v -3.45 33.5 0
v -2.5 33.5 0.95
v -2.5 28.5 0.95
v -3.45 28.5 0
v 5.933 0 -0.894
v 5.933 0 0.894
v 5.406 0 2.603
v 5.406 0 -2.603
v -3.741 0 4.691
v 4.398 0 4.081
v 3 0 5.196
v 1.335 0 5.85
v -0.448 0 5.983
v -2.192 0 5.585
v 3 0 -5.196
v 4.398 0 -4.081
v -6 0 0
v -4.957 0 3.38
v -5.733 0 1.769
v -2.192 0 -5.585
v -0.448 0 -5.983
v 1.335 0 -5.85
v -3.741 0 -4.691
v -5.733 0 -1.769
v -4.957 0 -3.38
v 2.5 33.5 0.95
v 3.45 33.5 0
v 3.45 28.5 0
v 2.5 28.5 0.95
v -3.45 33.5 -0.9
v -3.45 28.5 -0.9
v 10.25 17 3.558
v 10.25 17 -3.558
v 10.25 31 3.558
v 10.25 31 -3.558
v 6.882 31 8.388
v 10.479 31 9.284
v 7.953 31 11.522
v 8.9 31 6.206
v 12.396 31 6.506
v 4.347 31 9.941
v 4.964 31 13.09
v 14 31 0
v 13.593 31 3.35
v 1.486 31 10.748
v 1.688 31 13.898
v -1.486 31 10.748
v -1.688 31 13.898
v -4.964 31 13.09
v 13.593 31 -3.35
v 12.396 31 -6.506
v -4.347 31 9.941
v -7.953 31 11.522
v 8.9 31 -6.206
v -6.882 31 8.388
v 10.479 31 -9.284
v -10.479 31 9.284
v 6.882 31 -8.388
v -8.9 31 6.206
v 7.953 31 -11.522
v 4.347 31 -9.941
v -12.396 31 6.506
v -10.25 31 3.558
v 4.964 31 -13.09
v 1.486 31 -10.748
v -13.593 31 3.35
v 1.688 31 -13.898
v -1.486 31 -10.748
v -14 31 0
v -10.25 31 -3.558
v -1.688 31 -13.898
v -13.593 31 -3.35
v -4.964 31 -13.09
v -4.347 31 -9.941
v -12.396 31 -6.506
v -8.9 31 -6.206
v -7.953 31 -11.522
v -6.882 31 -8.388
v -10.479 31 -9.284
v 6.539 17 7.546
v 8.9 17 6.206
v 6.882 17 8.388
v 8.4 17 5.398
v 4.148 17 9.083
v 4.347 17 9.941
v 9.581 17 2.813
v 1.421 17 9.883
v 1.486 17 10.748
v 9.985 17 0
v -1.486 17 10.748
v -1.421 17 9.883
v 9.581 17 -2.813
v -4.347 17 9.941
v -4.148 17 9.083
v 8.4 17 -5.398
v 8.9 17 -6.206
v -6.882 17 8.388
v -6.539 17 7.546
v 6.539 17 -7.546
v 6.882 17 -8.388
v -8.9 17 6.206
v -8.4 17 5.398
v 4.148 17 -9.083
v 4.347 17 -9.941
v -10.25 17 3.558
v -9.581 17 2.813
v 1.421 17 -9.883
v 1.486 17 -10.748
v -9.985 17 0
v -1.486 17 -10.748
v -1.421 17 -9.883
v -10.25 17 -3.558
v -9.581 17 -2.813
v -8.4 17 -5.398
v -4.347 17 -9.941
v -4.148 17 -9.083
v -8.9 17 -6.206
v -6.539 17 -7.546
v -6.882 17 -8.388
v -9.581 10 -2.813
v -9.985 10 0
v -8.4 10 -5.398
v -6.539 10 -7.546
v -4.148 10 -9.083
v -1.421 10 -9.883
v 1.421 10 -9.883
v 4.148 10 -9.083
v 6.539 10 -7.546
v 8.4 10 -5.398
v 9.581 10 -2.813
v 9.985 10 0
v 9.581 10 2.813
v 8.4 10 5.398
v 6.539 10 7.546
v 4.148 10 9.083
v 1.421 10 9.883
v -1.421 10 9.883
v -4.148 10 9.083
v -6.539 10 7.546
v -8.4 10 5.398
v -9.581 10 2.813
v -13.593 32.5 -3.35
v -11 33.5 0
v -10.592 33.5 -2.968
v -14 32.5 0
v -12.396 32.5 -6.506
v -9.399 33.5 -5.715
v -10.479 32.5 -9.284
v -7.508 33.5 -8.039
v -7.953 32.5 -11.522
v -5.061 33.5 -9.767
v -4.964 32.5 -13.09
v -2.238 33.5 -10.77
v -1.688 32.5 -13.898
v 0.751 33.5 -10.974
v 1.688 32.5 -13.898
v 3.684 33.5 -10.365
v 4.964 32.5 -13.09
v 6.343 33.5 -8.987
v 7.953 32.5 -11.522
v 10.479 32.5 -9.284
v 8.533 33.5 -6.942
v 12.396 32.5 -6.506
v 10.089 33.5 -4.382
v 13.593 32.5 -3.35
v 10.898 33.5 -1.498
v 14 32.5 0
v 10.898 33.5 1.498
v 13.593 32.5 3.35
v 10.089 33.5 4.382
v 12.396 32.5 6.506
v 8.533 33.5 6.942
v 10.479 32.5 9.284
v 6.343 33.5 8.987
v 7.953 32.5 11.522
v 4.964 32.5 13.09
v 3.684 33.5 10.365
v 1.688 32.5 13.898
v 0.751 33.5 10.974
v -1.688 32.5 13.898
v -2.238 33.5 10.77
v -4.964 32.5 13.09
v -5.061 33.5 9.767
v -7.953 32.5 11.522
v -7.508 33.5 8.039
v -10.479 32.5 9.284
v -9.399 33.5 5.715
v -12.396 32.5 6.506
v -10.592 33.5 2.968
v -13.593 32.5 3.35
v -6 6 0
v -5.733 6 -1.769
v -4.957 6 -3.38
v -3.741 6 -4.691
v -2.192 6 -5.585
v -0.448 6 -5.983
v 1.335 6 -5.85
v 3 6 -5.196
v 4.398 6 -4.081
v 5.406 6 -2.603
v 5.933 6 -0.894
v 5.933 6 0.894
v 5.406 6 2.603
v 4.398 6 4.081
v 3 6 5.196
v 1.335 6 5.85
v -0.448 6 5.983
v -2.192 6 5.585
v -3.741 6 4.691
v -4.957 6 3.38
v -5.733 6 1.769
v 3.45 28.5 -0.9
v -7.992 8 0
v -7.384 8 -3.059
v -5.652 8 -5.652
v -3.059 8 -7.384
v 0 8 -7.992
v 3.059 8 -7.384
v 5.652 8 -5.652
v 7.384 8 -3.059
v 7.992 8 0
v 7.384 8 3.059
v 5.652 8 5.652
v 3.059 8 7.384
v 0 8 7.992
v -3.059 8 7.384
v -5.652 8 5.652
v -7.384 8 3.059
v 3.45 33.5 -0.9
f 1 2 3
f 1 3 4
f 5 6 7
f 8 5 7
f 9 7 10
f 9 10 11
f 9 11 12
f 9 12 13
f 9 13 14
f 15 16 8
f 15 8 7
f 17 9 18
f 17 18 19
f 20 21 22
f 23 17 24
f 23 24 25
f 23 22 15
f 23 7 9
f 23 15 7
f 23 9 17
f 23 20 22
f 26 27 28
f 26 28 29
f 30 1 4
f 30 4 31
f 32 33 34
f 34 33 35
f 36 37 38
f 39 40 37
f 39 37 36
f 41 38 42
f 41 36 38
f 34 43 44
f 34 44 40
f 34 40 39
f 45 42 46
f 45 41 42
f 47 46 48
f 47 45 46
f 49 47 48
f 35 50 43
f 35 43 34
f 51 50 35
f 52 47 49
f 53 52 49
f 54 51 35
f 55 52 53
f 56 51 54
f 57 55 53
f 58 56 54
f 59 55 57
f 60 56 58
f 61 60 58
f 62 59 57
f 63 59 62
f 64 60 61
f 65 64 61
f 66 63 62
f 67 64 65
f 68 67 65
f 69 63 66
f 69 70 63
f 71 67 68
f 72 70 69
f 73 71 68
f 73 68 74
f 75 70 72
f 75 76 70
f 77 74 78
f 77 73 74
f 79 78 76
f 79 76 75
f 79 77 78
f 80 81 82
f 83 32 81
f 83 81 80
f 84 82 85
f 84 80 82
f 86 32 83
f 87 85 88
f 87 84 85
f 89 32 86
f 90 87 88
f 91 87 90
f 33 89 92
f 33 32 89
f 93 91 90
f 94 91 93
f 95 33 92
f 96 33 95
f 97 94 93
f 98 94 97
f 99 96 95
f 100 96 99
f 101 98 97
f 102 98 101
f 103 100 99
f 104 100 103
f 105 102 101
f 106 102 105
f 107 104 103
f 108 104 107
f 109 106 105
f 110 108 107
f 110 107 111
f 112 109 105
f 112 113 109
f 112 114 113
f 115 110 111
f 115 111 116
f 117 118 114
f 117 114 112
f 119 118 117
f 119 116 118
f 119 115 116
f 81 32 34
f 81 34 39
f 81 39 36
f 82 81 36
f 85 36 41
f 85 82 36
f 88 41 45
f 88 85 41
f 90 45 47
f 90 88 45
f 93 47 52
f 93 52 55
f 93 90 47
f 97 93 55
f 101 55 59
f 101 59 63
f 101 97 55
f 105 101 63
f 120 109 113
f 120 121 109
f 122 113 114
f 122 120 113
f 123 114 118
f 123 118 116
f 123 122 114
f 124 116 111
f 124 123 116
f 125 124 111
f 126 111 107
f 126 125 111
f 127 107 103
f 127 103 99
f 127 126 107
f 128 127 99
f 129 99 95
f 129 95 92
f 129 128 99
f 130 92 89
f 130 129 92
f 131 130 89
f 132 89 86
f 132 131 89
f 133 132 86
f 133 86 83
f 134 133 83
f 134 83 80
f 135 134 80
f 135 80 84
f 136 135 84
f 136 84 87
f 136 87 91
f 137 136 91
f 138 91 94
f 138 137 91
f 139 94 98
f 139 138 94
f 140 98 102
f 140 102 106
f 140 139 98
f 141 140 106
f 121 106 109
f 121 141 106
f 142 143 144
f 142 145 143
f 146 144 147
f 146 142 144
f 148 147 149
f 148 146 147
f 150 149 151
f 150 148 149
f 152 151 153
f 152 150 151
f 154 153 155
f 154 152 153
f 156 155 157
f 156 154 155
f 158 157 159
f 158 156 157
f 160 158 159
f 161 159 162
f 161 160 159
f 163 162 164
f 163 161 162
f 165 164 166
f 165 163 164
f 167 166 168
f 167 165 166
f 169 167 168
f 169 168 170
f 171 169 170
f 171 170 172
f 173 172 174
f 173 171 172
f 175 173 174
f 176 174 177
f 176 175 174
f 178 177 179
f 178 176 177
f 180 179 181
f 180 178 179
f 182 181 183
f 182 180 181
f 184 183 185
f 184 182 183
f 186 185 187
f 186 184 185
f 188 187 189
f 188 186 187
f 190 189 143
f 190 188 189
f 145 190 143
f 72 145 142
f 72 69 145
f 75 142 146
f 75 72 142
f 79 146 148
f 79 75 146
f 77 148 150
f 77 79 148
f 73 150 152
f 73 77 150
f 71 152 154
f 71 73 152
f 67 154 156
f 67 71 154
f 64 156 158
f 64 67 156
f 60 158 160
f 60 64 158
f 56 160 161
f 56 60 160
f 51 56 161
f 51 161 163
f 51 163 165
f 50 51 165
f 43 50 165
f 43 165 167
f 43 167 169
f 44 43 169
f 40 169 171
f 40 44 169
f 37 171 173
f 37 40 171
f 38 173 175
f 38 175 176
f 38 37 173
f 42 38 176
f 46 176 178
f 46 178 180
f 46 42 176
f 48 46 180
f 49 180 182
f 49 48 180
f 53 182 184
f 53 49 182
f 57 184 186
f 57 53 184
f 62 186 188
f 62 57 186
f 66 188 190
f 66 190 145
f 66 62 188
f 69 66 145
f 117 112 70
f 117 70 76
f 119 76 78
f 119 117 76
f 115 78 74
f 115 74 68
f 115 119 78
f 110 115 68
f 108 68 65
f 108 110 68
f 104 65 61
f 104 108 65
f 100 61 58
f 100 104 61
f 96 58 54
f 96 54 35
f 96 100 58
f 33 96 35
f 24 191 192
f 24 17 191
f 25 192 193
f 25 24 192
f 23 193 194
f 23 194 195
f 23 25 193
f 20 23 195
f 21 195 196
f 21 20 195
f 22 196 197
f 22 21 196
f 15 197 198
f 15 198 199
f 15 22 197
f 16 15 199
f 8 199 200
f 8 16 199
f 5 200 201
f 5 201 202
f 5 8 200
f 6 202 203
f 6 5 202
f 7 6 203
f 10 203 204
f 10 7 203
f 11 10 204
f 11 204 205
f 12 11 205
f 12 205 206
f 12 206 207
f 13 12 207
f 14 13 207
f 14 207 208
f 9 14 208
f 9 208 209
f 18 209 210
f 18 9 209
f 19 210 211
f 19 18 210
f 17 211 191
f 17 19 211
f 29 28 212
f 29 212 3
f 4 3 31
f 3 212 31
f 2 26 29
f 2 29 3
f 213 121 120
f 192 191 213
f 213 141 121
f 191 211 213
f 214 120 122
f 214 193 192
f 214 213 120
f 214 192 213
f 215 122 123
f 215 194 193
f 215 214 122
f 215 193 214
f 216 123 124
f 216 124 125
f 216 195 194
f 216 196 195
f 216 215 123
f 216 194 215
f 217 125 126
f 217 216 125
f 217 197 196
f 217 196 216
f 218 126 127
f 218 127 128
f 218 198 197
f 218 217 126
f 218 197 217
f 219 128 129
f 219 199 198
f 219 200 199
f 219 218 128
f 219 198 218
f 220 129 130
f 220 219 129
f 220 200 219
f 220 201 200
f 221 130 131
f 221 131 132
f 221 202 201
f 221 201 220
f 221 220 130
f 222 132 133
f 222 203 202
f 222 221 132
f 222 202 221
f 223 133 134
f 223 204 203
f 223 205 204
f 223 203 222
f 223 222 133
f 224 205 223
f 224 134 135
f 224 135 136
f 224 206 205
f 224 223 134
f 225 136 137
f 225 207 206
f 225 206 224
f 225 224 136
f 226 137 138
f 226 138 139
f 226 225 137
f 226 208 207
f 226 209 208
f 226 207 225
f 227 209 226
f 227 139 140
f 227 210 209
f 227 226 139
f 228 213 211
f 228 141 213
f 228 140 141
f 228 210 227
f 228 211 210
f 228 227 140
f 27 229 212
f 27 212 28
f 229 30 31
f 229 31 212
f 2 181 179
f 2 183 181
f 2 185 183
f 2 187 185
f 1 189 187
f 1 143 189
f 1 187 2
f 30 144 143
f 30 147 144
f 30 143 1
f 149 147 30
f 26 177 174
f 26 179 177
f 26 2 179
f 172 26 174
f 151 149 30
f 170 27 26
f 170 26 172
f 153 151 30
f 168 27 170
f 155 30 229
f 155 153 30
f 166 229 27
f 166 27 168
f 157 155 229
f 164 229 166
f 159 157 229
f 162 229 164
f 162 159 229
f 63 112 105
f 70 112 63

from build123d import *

# Parameters (mm, degrees)
ENL_V_MAT_EXTRU_1_DEPTH = 5
ENL_V_MAT_EXTRU_2_REACH = 45.997
ESQUISSE3_W             = 0.6
ESQUISSE3_H             = 14


with BuildPart() as part:
    # Esquisse1 → Révolution1 (revolve)
    with BuildSketch(Plane.XY):
        Polygon((0, 33.5), (-11, 33.5), (-14, 32.5), (-14, 31), (-10.85, 31), (-10.85, 17), (-9.985, 17), (-9.985, 10), (-6, 6), (-6, 0), (0, 0), align=None)
    revolve(axis=Axis((0, 33.5, 0), (0, -1, 0)))

    # Esquisse2 → Enlèv. mat.-Extru.1 (cut)
    with BuildSketch(Plane(origin=(0, 33.5, 0), x_dir=(1, 0, 0), z_dir=(0, 1, 0))):
        Polygon((-3.45, 0.9), (3.45, 0.9), (3.45, 0), (2.5, -0.95), (-2.5, -0.95), (-3.45, 0), align=None)
    extrude(amount=-ENL_V_MAT_EXTRU_1_DEPTH, mode=Mode.SUBTRACT)

    # Esquisse3 → Enlèv. mat.-Extru.2 (cut, up to next)
    with BuildSketch(Plane(origin=(0, 0, -10.85), x_dir=(-1, 0, 0), z_dir=(0, 0, -1)), mode=Mode.PRIVATE) as enl_v_mat_extru_2_sk1:
        with Locations((10.55, 24)):
            Rectangle(ESQUISSE3_W, ESQUISSE3_H)
    enl_v_mat_extru_2_tool1 = extrude(enl_v_mat_extru_2_sk1.sketch, amount=-ENL_V_MAT_EXTRU_2_REACH, mode=Mode.PRIVATE) & part.part
    # Esquisse3 → Enlèv. mat.-Extru.2 (cut, up to next)
    with BuildSketch(Plane(origin=(0, 0, -10.85), x_dir=(-1, 0, 0), z_dir=(0, 0, -1)), mode=Mode.PRIVATE) as enl_v_mat_extru_2_sk2:
        with Locations((-10.55, 24)):
            Rectangle(ESQUISSE3_W, ESQUISSE3_H)
    enl_v_mat_extru_2_tool2 = extrude(enl_v_mat_extru_2_sk2.sketch, amount=-ENL_V_MAT_EXTRU_2_REACH, mode=Mode.PRIVATE) & part.part
    add(enl_v_mat_extru_2_tool1.solids().sort_by_distance((-10.55, 24, -10.85))[0], mode=Mode.SUBTRACT)
    add(enl_v_mat_extru_2_tool2.solids().sort_by_distance((10.55, 24, -10.85))[0], mode=Mode.SUBTRACT)


solid = part.part
